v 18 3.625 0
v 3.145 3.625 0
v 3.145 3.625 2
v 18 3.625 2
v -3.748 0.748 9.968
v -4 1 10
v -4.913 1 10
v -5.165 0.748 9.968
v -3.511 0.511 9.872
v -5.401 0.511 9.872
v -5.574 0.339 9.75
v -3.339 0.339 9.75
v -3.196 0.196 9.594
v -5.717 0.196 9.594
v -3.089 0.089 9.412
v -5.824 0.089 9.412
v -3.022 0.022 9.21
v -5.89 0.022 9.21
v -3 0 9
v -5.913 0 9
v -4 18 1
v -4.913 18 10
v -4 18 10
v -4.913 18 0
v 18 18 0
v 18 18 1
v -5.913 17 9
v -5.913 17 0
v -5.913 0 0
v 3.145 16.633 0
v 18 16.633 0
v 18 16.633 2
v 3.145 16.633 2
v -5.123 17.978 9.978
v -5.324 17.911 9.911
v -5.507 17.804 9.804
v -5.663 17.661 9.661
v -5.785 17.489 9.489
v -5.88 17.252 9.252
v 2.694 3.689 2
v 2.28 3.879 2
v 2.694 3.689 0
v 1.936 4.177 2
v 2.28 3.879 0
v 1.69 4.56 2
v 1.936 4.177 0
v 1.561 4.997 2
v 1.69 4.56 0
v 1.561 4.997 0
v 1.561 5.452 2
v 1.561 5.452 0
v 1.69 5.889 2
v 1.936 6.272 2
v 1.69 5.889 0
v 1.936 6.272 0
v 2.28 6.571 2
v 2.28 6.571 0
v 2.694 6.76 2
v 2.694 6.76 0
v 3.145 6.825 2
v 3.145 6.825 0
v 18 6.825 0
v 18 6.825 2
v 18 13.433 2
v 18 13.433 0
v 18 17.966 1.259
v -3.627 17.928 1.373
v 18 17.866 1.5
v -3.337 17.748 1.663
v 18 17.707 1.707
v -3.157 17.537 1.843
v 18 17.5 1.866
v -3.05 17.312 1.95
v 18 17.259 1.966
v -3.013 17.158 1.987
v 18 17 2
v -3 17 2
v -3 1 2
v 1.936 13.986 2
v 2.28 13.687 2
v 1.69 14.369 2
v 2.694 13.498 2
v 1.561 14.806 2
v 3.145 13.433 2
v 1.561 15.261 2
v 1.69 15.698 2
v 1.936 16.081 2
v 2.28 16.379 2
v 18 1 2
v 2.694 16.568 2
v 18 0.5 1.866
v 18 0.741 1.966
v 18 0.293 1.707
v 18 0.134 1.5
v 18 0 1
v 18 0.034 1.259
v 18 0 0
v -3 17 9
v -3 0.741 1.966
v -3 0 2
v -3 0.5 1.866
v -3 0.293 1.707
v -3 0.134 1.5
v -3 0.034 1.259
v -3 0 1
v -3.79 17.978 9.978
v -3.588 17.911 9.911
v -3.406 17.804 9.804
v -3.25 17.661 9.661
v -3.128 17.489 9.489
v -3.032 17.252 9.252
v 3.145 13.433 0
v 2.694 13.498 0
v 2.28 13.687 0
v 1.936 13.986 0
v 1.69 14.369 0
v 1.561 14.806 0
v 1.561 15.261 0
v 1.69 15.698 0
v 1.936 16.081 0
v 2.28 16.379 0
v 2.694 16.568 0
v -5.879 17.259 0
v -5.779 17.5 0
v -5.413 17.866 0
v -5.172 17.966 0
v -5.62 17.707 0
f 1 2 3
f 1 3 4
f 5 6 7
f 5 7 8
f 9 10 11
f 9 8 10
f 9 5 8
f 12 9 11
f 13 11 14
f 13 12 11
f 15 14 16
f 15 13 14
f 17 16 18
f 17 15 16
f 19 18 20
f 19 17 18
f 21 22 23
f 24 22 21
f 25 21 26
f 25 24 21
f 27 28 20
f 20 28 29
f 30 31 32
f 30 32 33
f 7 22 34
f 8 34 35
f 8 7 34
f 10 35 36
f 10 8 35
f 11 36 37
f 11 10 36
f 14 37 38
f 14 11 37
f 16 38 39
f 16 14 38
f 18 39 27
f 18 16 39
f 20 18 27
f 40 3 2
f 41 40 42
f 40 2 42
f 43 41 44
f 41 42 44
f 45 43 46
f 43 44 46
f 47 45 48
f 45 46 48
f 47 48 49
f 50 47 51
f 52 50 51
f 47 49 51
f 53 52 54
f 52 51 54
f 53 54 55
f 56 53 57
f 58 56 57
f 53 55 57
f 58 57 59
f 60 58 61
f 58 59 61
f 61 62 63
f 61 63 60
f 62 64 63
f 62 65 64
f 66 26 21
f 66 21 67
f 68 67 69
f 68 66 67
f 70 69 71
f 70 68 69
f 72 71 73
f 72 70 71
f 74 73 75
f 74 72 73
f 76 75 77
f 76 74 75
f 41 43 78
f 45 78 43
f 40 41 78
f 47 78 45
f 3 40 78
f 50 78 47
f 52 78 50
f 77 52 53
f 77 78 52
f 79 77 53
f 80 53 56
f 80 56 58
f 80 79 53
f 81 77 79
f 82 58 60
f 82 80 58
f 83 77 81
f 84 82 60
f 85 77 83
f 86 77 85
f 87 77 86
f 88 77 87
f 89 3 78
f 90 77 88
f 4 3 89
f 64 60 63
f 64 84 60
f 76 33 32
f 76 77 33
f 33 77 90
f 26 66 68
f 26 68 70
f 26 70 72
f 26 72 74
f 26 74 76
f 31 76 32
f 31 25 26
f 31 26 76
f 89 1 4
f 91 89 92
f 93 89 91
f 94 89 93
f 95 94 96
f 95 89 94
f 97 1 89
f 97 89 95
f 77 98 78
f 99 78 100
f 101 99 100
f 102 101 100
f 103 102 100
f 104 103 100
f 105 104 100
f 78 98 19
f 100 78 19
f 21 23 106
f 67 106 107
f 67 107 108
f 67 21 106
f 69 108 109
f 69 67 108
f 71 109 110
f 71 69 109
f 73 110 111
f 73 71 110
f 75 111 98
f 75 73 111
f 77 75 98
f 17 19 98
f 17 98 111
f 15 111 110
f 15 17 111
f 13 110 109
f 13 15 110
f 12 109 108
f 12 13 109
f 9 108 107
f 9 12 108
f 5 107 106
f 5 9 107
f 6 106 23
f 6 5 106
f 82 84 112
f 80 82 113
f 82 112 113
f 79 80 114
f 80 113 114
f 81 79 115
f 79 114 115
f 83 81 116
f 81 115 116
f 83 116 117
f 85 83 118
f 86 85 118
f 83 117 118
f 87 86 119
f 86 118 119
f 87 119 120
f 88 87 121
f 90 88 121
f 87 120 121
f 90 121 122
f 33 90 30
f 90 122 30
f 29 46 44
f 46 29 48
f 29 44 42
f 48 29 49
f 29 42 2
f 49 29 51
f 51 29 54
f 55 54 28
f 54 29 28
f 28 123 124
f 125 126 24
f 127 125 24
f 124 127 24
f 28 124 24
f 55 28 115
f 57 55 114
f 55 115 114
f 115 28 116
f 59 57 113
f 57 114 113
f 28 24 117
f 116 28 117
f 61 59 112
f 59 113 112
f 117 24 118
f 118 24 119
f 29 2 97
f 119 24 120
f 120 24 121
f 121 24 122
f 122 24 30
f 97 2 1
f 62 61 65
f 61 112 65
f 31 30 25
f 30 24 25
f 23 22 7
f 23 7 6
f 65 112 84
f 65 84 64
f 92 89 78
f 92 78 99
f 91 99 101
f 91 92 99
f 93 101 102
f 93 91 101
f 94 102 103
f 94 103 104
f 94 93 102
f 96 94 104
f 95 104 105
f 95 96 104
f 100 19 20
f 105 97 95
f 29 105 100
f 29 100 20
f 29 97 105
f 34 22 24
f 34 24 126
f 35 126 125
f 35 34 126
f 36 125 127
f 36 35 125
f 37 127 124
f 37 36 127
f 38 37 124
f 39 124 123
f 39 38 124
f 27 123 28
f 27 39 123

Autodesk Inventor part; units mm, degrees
ref_plane "YZ Plane" through (0, 0, 0) normal (1, 0, 0) x (0, 1, 0)
ref_plane "XZ Plane" through (0, 0, 0) normal (0, 1, 0) x (-1, 0, 0)
ref_plane "XY Plane" through (0, 0, 0) normal (0, 0, 1) x (1, 0, 0)
sketch "Skizze1" plane through (0, 0, 0) normal (0, 0, 1) x (1, 0, 0)
  line L0 (18, 18) -> (18, 0) construction
  line L1 (2, 18) -> (18, 18) construction
  line L2 (2, 0) -> (2, 18) construction
  line L3 (18, 0) -> (2, 0) construction
  line L4 (2, 18) -> (18, 18)
  line L5 (18, 0) -> (2, 0)
  line L6 (0.5764, 6.9713) -> (-2.7403, -18.928) construction
  circle A0 centre (14.2155, 15.0333) radius 1.2952 construction
  circle A1 centre (14.2155, 5.2246) radius 1.25 construction
  line L7 (2, 18) -> (-5.9127, 18)
  line L8 (-5.9127, 18) -> (-5.9127, 0)
  line L9 (-5.9127, 0) -> (2, 0)
  line L10 (18, 15.0333) -> (3.145, 15.0333) construction
  line L11 (18, 16.6333) -> (3.145, 16.6333)
  line L12 (3.145, 13.4333) -> (18, 13.4333)
  arc A2 (3.145, 16.6333) -> (3.145, 13.4333) centre (3.145, 15.0333) ccw
  line L13 (18, 5.2246) -> (3.145, 5.2246) construction
  line L14 (18, 6.8246) -> (3.145, 6.8246)
  line L15 (3.145, 3.6246) -> (18, 3.6246)
  arc A3 (3.145, 6.8246) -> (3.145, 3.6246) centre (3.145, 5.2246) ccw
  line L16 (-5.9127, 18) -> (18, 18)
  line L17 (18, 0) -> (-5.9127, 0)
  line L18 (-5.9127, 0) -> (-5.9127, 18)
  line L19 (18, 16.6333) -> (3.145, 16.6333)
  line L20 (18, 13.4333) -> (3.145, 13.4333)
  line L21 (18, 6.8246) -> (3.145, 6.8246)
  line L22 (18, 3.6246) -> (3.145, 3.6246)
  line L23 (18, 18) -> (18, 16.6333)
  line L24 (18, 18) -> (18, 16.6333)
  line L25 (18, 13.4333) -> (18, 6.8246)
  line L26 (18, 3.6246) -> (18, 0)
  line L27 (18, 13.4333) -> (18, 6.8246)
  line L28 (18, 3.6246) -> (18, 0)
  point P0 (0, 0)
  point P1 (10.5725, 15.0333)
  point P2 (10.5725, 5.2246)
  dimension "d0" = 2.5
  dimension "d1" = 3.2
  dimension "d2" = 3.2
extrude "Extrusion1" add sketch "Skizze1" along normal blind 10
sketch "Skizze2" plane through (0, 0, 10) normal (0, 0, 1) x (1, 0, 0)
  line L0 (-5.9127, 0) -> (18, 0) construction
  line L1 (18, 0) -> (18, 3.6246) construction
  line L2 (18, 3.6246) -> (3.145, 3.6246) construction
  arc A0 (3.145, 6.8246) -> (3.145, 3.6246) centre (3.145, 5.2246) ccw construction
  line L3 (3.145, 6.8246) -> (18, 6.8246) construction
  line L4 (18, 6.8246) -> (18, 13.4333) construction
  line L5 (18, 13.4333) -> (3.145, 13.4333) construction
  arc A1 (3.145, 16.6333) -> (3.145, 13.4333) centre (3.145, 15.0333) ccw construction
  line L6 (3.145, 16.6333) -> (18, 16.6333) construction
  line L7 (18, 16.6333) -> (18, 18) construction
  line L8 (18, 18) -> (-5.9127, 18) construction
  line L9 (-5.9127, 18) -> (-5.9127, 0) construction
  line L10 (18, 18) -> (-5.9127, 18) projected
  line L11 (-5.9127, 0) -> (18, 0) projected
  line L12 (18, 18) -> (-3, 18)
  line L13 (-3, 18) -> (-3, 0)
  line L14 (-3, 0) -> (18, 0)
  line L15 (18, 0) -> (18, 18)
  point P0 (0, 0)
  dimension "d5" = 21
extrude "Extrusion2" cut sketch "Skizze2" against normal blind 8
fillet "Rundung1" radius 1 7 edges at (-5.9127, 18, 5) (-3, 18, 6) (-3, 9, 10) (-5.9127, 9, 10) (-4.4563, 0, 10) (7.5, 18, 2) (7.5, 0, 2)
properties part number "Pusher"
